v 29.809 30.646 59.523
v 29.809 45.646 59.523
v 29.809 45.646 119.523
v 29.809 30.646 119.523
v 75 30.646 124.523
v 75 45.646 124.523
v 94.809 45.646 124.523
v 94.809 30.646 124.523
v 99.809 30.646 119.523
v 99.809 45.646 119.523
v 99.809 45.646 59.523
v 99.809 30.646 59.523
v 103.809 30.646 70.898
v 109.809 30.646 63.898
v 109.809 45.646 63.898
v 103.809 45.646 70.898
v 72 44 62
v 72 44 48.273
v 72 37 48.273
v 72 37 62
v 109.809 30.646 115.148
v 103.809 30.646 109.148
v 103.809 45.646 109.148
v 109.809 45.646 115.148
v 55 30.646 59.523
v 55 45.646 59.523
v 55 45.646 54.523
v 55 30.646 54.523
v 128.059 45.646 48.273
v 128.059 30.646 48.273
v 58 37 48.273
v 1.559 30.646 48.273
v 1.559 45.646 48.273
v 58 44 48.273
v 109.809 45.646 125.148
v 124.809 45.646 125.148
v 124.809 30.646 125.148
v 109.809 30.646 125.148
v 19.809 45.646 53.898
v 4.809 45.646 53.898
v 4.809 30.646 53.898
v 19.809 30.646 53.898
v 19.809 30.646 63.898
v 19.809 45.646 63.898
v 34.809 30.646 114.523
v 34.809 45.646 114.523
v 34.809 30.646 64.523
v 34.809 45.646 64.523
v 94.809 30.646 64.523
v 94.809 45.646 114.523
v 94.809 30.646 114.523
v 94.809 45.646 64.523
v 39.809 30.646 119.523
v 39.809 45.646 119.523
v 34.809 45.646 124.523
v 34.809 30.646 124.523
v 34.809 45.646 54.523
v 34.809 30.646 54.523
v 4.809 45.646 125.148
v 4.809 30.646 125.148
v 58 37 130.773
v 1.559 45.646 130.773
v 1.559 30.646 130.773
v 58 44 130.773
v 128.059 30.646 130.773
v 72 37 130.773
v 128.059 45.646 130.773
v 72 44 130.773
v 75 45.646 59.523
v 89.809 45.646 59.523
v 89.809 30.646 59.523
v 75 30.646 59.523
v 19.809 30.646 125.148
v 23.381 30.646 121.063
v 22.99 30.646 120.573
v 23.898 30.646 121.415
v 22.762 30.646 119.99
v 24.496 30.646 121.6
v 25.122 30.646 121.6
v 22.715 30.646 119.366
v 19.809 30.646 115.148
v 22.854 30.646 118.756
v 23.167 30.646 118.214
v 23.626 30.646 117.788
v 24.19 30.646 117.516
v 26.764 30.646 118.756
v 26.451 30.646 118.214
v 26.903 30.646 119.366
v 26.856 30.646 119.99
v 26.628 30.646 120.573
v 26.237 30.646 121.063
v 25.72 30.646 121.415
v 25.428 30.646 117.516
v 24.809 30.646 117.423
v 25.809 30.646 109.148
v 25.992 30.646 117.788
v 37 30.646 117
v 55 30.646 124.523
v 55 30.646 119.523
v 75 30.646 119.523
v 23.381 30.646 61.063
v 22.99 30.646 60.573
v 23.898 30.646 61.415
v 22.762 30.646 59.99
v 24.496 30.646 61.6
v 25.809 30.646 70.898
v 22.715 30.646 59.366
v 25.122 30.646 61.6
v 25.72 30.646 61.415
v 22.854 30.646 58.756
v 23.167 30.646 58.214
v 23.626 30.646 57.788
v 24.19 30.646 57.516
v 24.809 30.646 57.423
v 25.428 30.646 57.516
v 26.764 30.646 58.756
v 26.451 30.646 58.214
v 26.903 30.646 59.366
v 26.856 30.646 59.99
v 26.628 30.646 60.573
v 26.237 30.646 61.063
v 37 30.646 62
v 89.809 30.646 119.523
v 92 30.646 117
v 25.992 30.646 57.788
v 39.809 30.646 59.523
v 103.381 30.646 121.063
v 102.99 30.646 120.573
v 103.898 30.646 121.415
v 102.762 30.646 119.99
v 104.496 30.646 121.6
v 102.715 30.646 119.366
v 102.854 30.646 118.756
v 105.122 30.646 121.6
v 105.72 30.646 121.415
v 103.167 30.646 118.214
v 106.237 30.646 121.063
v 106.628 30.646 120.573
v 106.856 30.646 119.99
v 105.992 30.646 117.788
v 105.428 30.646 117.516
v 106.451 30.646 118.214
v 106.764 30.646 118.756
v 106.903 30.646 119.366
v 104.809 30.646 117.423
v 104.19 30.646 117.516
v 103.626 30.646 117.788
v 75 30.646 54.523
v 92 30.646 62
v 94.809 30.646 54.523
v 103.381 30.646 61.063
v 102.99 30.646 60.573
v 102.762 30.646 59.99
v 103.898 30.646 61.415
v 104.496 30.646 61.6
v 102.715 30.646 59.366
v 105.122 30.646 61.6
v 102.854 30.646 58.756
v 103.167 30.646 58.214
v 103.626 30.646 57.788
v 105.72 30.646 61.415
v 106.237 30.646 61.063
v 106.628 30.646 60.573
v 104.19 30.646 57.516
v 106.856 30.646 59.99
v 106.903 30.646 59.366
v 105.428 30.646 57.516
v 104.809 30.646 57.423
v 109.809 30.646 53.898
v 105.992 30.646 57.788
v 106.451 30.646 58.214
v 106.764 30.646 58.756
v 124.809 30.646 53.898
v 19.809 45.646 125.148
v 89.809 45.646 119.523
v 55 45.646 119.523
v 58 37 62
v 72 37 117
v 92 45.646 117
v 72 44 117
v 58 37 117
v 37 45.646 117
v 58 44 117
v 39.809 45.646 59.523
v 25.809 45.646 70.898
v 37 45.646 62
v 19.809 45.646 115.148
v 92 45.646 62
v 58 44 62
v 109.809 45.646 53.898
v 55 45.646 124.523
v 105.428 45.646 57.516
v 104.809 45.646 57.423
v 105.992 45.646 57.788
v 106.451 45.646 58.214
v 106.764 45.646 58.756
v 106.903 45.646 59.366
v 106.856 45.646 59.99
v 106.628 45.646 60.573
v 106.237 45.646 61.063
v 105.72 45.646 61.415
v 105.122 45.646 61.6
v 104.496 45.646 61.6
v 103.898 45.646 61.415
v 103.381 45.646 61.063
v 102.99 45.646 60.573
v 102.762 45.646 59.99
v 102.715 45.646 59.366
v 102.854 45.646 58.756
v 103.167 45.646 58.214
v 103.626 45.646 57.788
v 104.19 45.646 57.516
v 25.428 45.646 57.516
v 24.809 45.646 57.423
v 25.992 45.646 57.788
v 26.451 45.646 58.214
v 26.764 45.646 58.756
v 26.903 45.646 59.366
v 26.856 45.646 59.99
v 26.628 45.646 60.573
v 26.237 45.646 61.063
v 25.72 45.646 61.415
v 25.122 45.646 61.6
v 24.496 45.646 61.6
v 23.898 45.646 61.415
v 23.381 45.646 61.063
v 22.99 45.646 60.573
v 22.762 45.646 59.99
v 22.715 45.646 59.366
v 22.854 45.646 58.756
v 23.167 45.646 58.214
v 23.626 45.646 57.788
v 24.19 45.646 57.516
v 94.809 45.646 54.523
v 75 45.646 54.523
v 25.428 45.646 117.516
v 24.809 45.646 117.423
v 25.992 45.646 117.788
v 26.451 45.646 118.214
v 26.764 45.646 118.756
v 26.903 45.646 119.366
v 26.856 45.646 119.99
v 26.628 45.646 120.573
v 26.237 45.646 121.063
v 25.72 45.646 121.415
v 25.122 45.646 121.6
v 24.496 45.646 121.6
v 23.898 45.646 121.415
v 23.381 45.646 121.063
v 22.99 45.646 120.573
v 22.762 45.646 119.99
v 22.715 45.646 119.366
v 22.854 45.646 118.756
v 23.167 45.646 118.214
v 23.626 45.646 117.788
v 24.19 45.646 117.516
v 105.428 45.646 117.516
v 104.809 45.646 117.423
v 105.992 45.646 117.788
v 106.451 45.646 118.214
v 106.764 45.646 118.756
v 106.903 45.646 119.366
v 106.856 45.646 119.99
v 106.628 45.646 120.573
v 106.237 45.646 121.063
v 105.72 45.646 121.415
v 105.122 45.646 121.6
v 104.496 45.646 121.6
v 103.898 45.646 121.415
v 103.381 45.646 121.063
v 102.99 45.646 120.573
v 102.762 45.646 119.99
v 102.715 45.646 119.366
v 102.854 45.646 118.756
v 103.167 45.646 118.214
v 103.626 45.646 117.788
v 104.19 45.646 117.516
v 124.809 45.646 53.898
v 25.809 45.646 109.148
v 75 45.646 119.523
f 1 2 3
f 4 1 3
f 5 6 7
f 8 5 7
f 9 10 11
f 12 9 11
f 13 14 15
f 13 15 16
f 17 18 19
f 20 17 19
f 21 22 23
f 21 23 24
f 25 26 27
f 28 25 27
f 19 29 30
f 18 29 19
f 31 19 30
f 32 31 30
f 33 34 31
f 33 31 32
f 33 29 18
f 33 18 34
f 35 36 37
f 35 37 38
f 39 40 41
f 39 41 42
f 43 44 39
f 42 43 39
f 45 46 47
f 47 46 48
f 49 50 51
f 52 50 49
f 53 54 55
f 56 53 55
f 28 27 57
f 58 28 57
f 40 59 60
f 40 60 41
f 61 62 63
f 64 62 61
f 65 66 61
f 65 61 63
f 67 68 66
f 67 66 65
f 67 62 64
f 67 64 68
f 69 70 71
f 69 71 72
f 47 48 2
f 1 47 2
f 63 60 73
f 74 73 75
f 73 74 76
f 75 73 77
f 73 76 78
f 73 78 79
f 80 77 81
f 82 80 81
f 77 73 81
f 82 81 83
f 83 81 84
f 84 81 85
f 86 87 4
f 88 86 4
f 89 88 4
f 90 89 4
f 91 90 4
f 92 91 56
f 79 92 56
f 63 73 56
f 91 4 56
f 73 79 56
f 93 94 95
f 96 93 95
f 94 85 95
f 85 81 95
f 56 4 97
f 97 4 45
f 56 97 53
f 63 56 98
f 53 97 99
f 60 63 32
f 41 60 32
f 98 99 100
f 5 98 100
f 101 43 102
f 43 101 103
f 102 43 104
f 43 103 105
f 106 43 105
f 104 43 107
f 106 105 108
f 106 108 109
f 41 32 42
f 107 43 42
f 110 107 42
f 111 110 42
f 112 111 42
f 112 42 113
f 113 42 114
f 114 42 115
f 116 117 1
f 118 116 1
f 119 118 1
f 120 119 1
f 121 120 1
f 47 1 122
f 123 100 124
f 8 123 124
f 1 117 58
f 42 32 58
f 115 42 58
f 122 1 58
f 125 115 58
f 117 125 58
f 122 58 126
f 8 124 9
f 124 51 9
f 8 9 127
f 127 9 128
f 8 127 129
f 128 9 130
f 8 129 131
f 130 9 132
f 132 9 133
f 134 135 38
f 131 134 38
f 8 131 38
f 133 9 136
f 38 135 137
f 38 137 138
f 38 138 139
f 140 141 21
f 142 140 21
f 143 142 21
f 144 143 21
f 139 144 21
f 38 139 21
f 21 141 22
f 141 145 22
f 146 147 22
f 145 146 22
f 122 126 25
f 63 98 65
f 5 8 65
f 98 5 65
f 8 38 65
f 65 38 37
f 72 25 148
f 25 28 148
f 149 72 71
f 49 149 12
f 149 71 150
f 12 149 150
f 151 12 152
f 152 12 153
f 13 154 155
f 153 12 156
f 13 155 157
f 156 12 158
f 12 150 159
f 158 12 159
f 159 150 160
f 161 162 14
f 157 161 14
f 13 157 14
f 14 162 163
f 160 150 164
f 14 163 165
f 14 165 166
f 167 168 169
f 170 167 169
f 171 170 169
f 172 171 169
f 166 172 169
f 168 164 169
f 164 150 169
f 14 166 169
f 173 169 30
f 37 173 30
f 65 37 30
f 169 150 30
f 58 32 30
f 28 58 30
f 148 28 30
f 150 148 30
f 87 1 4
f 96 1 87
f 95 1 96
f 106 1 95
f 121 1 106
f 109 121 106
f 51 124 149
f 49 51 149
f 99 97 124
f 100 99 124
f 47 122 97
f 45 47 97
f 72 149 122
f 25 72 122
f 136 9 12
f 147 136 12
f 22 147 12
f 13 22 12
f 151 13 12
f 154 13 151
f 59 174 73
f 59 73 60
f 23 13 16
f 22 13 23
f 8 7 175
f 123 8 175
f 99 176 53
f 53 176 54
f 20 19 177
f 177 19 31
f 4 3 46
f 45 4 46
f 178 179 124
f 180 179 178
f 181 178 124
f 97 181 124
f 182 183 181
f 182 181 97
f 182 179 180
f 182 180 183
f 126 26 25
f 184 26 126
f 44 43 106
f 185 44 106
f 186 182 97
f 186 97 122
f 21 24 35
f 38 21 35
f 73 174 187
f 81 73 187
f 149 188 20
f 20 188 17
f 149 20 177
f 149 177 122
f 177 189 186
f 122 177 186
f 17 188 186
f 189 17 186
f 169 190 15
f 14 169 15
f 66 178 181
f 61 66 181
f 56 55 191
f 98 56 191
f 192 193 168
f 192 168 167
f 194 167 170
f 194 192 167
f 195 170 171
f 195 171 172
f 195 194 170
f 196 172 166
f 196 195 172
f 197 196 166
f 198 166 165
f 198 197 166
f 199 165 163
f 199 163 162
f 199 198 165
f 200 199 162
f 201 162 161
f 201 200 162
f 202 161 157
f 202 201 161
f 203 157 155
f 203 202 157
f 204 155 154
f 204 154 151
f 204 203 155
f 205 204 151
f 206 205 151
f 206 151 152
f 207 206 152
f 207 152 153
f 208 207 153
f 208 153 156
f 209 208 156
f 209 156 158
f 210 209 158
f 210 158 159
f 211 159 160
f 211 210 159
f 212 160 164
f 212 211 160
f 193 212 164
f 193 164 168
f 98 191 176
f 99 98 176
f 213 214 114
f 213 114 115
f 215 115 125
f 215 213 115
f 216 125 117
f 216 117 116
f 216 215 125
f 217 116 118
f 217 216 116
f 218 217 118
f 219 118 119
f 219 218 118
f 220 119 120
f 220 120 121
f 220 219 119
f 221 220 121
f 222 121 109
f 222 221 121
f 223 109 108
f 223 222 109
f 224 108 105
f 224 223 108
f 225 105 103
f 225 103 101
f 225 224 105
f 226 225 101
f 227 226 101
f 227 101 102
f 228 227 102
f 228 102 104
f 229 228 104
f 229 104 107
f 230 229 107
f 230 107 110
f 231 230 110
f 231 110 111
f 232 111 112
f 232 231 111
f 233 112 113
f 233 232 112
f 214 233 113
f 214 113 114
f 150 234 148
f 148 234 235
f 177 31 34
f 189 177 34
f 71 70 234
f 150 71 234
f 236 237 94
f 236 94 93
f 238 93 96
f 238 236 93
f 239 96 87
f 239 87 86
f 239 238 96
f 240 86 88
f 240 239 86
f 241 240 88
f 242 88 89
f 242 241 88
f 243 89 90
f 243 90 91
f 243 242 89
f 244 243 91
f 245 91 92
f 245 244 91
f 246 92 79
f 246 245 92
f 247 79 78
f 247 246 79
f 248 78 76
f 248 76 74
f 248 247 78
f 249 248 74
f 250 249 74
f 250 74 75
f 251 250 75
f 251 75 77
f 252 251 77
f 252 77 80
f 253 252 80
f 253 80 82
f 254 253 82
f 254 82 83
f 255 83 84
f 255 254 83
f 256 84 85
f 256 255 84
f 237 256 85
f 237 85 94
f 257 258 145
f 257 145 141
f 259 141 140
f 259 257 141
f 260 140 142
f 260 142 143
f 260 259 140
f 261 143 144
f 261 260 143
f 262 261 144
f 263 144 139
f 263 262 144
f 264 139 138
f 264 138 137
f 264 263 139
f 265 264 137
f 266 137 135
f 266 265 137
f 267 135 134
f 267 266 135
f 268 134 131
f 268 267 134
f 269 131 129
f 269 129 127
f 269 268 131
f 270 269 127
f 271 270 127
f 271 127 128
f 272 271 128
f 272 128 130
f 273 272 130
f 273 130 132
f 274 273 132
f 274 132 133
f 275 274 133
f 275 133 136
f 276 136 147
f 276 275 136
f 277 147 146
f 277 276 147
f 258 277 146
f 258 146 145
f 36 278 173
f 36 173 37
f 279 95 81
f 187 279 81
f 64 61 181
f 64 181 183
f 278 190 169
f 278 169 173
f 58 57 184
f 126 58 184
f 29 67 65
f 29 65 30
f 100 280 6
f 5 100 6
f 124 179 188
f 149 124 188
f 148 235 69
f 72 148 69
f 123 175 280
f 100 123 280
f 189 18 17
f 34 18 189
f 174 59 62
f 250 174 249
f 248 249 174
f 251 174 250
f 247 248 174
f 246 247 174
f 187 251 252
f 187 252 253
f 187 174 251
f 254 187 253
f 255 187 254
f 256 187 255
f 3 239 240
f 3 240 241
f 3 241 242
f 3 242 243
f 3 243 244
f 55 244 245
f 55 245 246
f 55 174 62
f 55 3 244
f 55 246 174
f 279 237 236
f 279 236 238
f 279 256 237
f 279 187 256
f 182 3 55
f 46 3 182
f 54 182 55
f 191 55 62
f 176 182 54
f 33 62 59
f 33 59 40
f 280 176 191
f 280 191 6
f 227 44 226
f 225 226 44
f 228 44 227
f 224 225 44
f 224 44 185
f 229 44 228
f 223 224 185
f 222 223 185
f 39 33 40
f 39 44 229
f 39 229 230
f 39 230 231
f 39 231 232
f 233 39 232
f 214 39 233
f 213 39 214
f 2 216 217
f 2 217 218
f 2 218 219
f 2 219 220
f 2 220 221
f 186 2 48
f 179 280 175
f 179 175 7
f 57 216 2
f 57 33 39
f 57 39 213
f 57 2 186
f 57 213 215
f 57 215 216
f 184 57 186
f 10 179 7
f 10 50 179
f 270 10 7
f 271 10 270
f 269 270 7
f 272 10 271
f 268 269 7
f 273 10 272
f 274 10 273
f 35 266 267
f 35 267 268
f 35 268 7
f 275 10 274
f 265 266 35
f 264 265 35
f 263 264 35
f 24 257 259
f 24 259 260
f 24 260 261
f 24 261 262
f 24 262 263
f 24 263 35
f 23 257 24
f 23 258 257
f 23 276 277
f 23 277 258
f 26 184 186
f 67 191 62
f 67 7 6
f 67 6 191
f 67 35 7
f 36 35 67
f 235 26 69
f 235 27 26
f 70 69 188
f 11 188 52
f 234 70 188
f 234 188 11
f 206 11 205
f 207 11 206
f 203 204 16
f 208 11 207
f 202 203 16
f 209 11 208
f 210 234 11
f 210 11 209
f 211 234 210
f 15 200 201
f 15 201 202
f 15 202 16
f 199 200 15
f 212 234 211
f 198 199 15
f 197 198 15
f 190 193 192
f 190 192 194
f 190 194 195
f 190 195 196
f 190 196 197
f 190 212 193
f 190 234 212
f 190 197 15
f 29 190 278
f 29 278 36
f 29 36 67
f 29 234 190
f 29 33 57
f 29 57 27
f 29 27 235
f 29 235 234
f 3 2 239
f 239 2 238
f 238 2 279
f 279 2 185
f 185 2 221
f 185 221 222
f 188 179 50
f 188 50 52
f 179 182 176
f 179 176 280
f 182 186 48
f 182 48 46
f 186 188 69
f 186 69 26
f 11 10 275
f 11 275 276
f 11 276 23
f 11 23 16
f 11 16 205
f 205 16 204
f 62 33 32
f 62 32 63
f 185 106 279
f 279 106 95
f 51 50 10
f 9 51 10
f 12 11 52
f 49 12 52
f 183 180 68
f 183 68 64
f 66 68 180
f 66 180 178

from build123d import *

# Parameters (mm, degrees)
SKETCH_1_R               = 2.1
SKETCH_1_W               = 60
SKETCH_1_H               = 60
SKETCH_1_W_2             = 55
SKETCH_1_H_2             = 55
EXTRUDE_1_DEPTH          = 15
CUT_EXTRUDE_1_DEPTH      = 160.024864418
CUT_EXTRUDE_1_DEPTH_BACK = 160.024864418
CUT_EXTRUDE_2_DEPTH      = 184.645620758
CUT_EXTRUDE_2_DEPTH_BACK = 184.645620758


with BuildPart() as part:
    # Эскиз1 → Бобышка-Вытянуть1 (new body)
    # profile 1 of 13: a face of its own
    with BuildSketch(Plane(origin=(0, 45.645974268, 0), x_dir=(-1, 0, 0), z_dir=(0, -1, 0))):
        Polygon((-109.808980694, -130.773129836), (-128.058980694, -130.773129836), (-128.058980694, -48.273129836), (-109.808980694, -48.273129836), (-109.808980694, -53.898129836), (-124.808980694, -53.898129836), (-124.808980694, -125.148129836), (-109.808980694, -125.148129836), align=None)
    # profile 2 of 13: a face of its own
    with BuildSketch(Plane(origin=(0, 45.645974268, 0), x_dir=(-1, 0, 0), z_dir=(0, -1, 0))):
        Polygon((-109.808980694, -130.773129836), (-99.808980694, -130.773129836), (-99.808980694, -124.523129836), (-99.808980694, -119.523129836), (-99.808980694, -95.523129836), (-99.808980694, -83.523129836), (-99.808980694, -59.523129836), (-99.808980694, -54.523129836), (-99.808980694, -48.273129836), (-109.808980694, -48.273129836), (-109.808980694, -53.898129836), (-109.808980694, -125.148129836), align=None)
        with Locations(Location((-104.808980694, -119.523129836, 0), (0, 0, 90))):
            Circle(SKETCH_1_R, mode=Mode.SUBTRACT)
        with Locations(Location((-104.808980694, -59.523129836, 0), (0, 0, 90))):
            Circle(SKETCH_1_R, mode=Mode.SUBTRACT)
    # profile 3 of 13: a face of its own
    with BuildSketch(Plane(origin=(0, 45.645974268, 0), x_dir=(-1, 0, 0), z_dir=(0, -1, 0))):
        with Locations((-64.808980694, -89.523129836)):
            Rectangle(SKETCH_1_W, SKETCH_1_H)
        with Locations((-64.5, -89.5)):
            Rectangle(SKETCH_1_W_2, SKETCH_1_H_2, mode=Mode.SUBTRACT)
    # profile 4 of 13: a face of its own
    with BuildSketch(Plane(origin=(0, 45.645974268, 0), x_dir=(-1, 0, 0), z_dir=(0, -1, 0))):
        Polygon((-64.808980694, -124.523129836), (-55, -124.523129836), (-55, -119.523129836), (-75, -119.523129836), (-75, -124.523129836), align=None)
    # profile 5 of 13: a face of its own
    with BuildSketch(Plane(origin=(0, 45.645974268, 0), x_dir=(-1, 0, 0), z_dir=(0, -1, 0))):
        Polygon((-99.808980694, -130.773129836), (-99.808980694, -124.523129836), (-64.808980694, -124.523129836), (-29.808980694, -124.523129836), (-29.808980694, -130.773129836), align=None)
    # profile 6 of 13: a face of its own
    with BuildSketch(Plane(origin=(0, 45.645974268, 0), x_dir=(-1, 0, 0), z_dir=(0, -1, 0))):
        Polygon((-99.808980694, -54.523129836), (-99.808980694, -48.273129836), (-29.808980694, -48.273129836), (-29.808980694, -54.523129836), (-64.808980694, -54.523129836), align=None)
    # profile 7 of 13: a face of its own
    with BuildSketch(Plane(origin=(0, 45.645974268, 0), x_dir=(-1, 0, 0), z_dir=(0, -1, 0))):
        Polygon((-29.808980694, -130.773129836), (-29.808980694, -124.523129836), (-29.808980694, -54.523129836), (-29.808980694, -48.273129836), (-19.808980694, -48.273129836), (-19.808980694, -53.898129836), (-19.808980694, -125.148129836), (-19.808980694, -130.773129836), align=None)
        with Locations(Location((-24.808980694, -119.523129836, 0), (0, 0, 90))):
            Circle(SKETCH_1_R, mode=Mode.SUBTRACT)
        with Locations(Location((-24.808980694, -59.523129836, 0), (0, 0, 90))):
            Circle(SKETCH_1_R, mode=Mode.SUBTRACT)
    # profile 8 of 13: a face of its own
    with BuildSketch(Plane(origin=(0, 45.645974268, 0), x_dir=(-1, 0, 0), z_dir=(0, -1, 0))):
        Polygon((-4.808980694, -125.148129836), (-4.808980694, -53.898129836), (-19.808980694, -53.898129836), (-19.808980694, -48.273129836), (-1.558980694, -48.273129836), (-1.558980694, -130.773129836), (-19.808980694, -130.773129836), (-19.808980694, -125.148129836), align=None)
    # profile 9 of 13: a face of its own
    with BuildSketch(Plane(origin=(0, 45.645974268, 0), x_dir=(-1, 0, 0), z_dir=(0, -1, 0))):
        Polygon((-99.808980694, -119.523129836), (-99.808980694, -124.523129836), (-94.808980694, -124.523129836), (-89.808980694, -119.523129836), (-94.808980694, -119.523129836), (-94.808980694, -114.523129836), align=None)
    # profile 10 of 13: a face of its own
    with BuildSketch(Plane(origin=(0, 45.645974268, 0), x_dir=(-1, 0, 0), z_dir=(0, -1, 0))):
        Polygon((-34.808980694, -124.523129836), (-29.808980694, -124.523129836), (-29.808980694, -119.523129836), (-34.808980694, -114.523129836), (-34.808980694, -119.523129836), (-39.808980694, -119.523129836), align=None)
    # profile 11 of 13: a face of its own
    with BuildSketch(Plane(origin=(0, 45.645974268, 0), x_dir=(-1, 0, 0), z_dir=(0, -1, 0))):
        Polygon((-34.808980694, -64.523129836), (-29.808980694, -59.523129836), (-29.808980694, -54.523129836), (-34.808980694, -54.523129836), (-39.808980694, -59.523129836), (-34.808980694, -59.523129836), align=None)
    # profile 12 of 13: a face of its own
    with BuildSketch(Plane(origin=(0, 45.645974268, 0), x_dir=(-1, 0, 0), z_dir=(0, -1, 0))):
        Polygon((-99.808980694, -54.523129836), (-99.808980694, -59.523129836), (-94.808980694, -64.523129836), (-94.808980694, -59.523129836), (-89.808980694, -59.523129836), (-94.808980694, -54.523129836), align=None)
    # profile 13 of 13: a face of its own
    with BuildSketch(Plane(origin=(0, 45.645974268, 0), x_dir=(-1, 0, 0), z_dir=(0, -1, 0))):
        Polygon((-55, -59.523129836), (-55, -54.523129836), (-64.808980694, -54.523129836), (-75, -54.523129836), (-75, -59.523129836), align=None)
    extrude(amount=EXTRUDE_1_DEPTH)

    # Эскиз2 → Вырез-Вытянуть1 (cut, two sides: drawn at the far end of the back side and taken through both)
    with BuildSketch(Plane.XY.offset(130.773129836).offset(-CUT_EXTRUDE_1_DEPTH_BACK)):
        Polygon((64.808980694, 44), (72, 44), (72, 37), (58, 37), (58, 44), align=None)
    extrude(amount=CUT_EXTRUDE_1_DEPTH + CUT_EXTRUDE_1_DEPTH_BACK, mode=Mode.SUBTRACT)

    # Эскиз3 → Вырез-Вытянуть2 (cut, two sides: drawn at the far end of the back side and taken through both)
    with BuildSketch(Plane(origin=(0, 45.645974268, 0), x_dir=(1, 0, 0), z_dir=(0, 1, 0)).offset(-CUT_EXTRUDE_2_DEPTH_BACK)):
        Polygon((103.808980694, -70.898129836), (103.808980694, -109.148129836), (109.808980694, -115.148129836), (109.808980694, -63.898129836), align=None)
        Polygon((25.808980694, -70.898129836), (25.808980694, -109.148129836), (19.808980694, -115.148129836), (19.808980694, -63.898129836), align=None)
    extrude(amount=CUT_EXTRUDE_2_DEPTH + CUT_EXTRUDE_2_DEPTH_BACK, mode=Mode.SUBTRACT)


solid = part.part
